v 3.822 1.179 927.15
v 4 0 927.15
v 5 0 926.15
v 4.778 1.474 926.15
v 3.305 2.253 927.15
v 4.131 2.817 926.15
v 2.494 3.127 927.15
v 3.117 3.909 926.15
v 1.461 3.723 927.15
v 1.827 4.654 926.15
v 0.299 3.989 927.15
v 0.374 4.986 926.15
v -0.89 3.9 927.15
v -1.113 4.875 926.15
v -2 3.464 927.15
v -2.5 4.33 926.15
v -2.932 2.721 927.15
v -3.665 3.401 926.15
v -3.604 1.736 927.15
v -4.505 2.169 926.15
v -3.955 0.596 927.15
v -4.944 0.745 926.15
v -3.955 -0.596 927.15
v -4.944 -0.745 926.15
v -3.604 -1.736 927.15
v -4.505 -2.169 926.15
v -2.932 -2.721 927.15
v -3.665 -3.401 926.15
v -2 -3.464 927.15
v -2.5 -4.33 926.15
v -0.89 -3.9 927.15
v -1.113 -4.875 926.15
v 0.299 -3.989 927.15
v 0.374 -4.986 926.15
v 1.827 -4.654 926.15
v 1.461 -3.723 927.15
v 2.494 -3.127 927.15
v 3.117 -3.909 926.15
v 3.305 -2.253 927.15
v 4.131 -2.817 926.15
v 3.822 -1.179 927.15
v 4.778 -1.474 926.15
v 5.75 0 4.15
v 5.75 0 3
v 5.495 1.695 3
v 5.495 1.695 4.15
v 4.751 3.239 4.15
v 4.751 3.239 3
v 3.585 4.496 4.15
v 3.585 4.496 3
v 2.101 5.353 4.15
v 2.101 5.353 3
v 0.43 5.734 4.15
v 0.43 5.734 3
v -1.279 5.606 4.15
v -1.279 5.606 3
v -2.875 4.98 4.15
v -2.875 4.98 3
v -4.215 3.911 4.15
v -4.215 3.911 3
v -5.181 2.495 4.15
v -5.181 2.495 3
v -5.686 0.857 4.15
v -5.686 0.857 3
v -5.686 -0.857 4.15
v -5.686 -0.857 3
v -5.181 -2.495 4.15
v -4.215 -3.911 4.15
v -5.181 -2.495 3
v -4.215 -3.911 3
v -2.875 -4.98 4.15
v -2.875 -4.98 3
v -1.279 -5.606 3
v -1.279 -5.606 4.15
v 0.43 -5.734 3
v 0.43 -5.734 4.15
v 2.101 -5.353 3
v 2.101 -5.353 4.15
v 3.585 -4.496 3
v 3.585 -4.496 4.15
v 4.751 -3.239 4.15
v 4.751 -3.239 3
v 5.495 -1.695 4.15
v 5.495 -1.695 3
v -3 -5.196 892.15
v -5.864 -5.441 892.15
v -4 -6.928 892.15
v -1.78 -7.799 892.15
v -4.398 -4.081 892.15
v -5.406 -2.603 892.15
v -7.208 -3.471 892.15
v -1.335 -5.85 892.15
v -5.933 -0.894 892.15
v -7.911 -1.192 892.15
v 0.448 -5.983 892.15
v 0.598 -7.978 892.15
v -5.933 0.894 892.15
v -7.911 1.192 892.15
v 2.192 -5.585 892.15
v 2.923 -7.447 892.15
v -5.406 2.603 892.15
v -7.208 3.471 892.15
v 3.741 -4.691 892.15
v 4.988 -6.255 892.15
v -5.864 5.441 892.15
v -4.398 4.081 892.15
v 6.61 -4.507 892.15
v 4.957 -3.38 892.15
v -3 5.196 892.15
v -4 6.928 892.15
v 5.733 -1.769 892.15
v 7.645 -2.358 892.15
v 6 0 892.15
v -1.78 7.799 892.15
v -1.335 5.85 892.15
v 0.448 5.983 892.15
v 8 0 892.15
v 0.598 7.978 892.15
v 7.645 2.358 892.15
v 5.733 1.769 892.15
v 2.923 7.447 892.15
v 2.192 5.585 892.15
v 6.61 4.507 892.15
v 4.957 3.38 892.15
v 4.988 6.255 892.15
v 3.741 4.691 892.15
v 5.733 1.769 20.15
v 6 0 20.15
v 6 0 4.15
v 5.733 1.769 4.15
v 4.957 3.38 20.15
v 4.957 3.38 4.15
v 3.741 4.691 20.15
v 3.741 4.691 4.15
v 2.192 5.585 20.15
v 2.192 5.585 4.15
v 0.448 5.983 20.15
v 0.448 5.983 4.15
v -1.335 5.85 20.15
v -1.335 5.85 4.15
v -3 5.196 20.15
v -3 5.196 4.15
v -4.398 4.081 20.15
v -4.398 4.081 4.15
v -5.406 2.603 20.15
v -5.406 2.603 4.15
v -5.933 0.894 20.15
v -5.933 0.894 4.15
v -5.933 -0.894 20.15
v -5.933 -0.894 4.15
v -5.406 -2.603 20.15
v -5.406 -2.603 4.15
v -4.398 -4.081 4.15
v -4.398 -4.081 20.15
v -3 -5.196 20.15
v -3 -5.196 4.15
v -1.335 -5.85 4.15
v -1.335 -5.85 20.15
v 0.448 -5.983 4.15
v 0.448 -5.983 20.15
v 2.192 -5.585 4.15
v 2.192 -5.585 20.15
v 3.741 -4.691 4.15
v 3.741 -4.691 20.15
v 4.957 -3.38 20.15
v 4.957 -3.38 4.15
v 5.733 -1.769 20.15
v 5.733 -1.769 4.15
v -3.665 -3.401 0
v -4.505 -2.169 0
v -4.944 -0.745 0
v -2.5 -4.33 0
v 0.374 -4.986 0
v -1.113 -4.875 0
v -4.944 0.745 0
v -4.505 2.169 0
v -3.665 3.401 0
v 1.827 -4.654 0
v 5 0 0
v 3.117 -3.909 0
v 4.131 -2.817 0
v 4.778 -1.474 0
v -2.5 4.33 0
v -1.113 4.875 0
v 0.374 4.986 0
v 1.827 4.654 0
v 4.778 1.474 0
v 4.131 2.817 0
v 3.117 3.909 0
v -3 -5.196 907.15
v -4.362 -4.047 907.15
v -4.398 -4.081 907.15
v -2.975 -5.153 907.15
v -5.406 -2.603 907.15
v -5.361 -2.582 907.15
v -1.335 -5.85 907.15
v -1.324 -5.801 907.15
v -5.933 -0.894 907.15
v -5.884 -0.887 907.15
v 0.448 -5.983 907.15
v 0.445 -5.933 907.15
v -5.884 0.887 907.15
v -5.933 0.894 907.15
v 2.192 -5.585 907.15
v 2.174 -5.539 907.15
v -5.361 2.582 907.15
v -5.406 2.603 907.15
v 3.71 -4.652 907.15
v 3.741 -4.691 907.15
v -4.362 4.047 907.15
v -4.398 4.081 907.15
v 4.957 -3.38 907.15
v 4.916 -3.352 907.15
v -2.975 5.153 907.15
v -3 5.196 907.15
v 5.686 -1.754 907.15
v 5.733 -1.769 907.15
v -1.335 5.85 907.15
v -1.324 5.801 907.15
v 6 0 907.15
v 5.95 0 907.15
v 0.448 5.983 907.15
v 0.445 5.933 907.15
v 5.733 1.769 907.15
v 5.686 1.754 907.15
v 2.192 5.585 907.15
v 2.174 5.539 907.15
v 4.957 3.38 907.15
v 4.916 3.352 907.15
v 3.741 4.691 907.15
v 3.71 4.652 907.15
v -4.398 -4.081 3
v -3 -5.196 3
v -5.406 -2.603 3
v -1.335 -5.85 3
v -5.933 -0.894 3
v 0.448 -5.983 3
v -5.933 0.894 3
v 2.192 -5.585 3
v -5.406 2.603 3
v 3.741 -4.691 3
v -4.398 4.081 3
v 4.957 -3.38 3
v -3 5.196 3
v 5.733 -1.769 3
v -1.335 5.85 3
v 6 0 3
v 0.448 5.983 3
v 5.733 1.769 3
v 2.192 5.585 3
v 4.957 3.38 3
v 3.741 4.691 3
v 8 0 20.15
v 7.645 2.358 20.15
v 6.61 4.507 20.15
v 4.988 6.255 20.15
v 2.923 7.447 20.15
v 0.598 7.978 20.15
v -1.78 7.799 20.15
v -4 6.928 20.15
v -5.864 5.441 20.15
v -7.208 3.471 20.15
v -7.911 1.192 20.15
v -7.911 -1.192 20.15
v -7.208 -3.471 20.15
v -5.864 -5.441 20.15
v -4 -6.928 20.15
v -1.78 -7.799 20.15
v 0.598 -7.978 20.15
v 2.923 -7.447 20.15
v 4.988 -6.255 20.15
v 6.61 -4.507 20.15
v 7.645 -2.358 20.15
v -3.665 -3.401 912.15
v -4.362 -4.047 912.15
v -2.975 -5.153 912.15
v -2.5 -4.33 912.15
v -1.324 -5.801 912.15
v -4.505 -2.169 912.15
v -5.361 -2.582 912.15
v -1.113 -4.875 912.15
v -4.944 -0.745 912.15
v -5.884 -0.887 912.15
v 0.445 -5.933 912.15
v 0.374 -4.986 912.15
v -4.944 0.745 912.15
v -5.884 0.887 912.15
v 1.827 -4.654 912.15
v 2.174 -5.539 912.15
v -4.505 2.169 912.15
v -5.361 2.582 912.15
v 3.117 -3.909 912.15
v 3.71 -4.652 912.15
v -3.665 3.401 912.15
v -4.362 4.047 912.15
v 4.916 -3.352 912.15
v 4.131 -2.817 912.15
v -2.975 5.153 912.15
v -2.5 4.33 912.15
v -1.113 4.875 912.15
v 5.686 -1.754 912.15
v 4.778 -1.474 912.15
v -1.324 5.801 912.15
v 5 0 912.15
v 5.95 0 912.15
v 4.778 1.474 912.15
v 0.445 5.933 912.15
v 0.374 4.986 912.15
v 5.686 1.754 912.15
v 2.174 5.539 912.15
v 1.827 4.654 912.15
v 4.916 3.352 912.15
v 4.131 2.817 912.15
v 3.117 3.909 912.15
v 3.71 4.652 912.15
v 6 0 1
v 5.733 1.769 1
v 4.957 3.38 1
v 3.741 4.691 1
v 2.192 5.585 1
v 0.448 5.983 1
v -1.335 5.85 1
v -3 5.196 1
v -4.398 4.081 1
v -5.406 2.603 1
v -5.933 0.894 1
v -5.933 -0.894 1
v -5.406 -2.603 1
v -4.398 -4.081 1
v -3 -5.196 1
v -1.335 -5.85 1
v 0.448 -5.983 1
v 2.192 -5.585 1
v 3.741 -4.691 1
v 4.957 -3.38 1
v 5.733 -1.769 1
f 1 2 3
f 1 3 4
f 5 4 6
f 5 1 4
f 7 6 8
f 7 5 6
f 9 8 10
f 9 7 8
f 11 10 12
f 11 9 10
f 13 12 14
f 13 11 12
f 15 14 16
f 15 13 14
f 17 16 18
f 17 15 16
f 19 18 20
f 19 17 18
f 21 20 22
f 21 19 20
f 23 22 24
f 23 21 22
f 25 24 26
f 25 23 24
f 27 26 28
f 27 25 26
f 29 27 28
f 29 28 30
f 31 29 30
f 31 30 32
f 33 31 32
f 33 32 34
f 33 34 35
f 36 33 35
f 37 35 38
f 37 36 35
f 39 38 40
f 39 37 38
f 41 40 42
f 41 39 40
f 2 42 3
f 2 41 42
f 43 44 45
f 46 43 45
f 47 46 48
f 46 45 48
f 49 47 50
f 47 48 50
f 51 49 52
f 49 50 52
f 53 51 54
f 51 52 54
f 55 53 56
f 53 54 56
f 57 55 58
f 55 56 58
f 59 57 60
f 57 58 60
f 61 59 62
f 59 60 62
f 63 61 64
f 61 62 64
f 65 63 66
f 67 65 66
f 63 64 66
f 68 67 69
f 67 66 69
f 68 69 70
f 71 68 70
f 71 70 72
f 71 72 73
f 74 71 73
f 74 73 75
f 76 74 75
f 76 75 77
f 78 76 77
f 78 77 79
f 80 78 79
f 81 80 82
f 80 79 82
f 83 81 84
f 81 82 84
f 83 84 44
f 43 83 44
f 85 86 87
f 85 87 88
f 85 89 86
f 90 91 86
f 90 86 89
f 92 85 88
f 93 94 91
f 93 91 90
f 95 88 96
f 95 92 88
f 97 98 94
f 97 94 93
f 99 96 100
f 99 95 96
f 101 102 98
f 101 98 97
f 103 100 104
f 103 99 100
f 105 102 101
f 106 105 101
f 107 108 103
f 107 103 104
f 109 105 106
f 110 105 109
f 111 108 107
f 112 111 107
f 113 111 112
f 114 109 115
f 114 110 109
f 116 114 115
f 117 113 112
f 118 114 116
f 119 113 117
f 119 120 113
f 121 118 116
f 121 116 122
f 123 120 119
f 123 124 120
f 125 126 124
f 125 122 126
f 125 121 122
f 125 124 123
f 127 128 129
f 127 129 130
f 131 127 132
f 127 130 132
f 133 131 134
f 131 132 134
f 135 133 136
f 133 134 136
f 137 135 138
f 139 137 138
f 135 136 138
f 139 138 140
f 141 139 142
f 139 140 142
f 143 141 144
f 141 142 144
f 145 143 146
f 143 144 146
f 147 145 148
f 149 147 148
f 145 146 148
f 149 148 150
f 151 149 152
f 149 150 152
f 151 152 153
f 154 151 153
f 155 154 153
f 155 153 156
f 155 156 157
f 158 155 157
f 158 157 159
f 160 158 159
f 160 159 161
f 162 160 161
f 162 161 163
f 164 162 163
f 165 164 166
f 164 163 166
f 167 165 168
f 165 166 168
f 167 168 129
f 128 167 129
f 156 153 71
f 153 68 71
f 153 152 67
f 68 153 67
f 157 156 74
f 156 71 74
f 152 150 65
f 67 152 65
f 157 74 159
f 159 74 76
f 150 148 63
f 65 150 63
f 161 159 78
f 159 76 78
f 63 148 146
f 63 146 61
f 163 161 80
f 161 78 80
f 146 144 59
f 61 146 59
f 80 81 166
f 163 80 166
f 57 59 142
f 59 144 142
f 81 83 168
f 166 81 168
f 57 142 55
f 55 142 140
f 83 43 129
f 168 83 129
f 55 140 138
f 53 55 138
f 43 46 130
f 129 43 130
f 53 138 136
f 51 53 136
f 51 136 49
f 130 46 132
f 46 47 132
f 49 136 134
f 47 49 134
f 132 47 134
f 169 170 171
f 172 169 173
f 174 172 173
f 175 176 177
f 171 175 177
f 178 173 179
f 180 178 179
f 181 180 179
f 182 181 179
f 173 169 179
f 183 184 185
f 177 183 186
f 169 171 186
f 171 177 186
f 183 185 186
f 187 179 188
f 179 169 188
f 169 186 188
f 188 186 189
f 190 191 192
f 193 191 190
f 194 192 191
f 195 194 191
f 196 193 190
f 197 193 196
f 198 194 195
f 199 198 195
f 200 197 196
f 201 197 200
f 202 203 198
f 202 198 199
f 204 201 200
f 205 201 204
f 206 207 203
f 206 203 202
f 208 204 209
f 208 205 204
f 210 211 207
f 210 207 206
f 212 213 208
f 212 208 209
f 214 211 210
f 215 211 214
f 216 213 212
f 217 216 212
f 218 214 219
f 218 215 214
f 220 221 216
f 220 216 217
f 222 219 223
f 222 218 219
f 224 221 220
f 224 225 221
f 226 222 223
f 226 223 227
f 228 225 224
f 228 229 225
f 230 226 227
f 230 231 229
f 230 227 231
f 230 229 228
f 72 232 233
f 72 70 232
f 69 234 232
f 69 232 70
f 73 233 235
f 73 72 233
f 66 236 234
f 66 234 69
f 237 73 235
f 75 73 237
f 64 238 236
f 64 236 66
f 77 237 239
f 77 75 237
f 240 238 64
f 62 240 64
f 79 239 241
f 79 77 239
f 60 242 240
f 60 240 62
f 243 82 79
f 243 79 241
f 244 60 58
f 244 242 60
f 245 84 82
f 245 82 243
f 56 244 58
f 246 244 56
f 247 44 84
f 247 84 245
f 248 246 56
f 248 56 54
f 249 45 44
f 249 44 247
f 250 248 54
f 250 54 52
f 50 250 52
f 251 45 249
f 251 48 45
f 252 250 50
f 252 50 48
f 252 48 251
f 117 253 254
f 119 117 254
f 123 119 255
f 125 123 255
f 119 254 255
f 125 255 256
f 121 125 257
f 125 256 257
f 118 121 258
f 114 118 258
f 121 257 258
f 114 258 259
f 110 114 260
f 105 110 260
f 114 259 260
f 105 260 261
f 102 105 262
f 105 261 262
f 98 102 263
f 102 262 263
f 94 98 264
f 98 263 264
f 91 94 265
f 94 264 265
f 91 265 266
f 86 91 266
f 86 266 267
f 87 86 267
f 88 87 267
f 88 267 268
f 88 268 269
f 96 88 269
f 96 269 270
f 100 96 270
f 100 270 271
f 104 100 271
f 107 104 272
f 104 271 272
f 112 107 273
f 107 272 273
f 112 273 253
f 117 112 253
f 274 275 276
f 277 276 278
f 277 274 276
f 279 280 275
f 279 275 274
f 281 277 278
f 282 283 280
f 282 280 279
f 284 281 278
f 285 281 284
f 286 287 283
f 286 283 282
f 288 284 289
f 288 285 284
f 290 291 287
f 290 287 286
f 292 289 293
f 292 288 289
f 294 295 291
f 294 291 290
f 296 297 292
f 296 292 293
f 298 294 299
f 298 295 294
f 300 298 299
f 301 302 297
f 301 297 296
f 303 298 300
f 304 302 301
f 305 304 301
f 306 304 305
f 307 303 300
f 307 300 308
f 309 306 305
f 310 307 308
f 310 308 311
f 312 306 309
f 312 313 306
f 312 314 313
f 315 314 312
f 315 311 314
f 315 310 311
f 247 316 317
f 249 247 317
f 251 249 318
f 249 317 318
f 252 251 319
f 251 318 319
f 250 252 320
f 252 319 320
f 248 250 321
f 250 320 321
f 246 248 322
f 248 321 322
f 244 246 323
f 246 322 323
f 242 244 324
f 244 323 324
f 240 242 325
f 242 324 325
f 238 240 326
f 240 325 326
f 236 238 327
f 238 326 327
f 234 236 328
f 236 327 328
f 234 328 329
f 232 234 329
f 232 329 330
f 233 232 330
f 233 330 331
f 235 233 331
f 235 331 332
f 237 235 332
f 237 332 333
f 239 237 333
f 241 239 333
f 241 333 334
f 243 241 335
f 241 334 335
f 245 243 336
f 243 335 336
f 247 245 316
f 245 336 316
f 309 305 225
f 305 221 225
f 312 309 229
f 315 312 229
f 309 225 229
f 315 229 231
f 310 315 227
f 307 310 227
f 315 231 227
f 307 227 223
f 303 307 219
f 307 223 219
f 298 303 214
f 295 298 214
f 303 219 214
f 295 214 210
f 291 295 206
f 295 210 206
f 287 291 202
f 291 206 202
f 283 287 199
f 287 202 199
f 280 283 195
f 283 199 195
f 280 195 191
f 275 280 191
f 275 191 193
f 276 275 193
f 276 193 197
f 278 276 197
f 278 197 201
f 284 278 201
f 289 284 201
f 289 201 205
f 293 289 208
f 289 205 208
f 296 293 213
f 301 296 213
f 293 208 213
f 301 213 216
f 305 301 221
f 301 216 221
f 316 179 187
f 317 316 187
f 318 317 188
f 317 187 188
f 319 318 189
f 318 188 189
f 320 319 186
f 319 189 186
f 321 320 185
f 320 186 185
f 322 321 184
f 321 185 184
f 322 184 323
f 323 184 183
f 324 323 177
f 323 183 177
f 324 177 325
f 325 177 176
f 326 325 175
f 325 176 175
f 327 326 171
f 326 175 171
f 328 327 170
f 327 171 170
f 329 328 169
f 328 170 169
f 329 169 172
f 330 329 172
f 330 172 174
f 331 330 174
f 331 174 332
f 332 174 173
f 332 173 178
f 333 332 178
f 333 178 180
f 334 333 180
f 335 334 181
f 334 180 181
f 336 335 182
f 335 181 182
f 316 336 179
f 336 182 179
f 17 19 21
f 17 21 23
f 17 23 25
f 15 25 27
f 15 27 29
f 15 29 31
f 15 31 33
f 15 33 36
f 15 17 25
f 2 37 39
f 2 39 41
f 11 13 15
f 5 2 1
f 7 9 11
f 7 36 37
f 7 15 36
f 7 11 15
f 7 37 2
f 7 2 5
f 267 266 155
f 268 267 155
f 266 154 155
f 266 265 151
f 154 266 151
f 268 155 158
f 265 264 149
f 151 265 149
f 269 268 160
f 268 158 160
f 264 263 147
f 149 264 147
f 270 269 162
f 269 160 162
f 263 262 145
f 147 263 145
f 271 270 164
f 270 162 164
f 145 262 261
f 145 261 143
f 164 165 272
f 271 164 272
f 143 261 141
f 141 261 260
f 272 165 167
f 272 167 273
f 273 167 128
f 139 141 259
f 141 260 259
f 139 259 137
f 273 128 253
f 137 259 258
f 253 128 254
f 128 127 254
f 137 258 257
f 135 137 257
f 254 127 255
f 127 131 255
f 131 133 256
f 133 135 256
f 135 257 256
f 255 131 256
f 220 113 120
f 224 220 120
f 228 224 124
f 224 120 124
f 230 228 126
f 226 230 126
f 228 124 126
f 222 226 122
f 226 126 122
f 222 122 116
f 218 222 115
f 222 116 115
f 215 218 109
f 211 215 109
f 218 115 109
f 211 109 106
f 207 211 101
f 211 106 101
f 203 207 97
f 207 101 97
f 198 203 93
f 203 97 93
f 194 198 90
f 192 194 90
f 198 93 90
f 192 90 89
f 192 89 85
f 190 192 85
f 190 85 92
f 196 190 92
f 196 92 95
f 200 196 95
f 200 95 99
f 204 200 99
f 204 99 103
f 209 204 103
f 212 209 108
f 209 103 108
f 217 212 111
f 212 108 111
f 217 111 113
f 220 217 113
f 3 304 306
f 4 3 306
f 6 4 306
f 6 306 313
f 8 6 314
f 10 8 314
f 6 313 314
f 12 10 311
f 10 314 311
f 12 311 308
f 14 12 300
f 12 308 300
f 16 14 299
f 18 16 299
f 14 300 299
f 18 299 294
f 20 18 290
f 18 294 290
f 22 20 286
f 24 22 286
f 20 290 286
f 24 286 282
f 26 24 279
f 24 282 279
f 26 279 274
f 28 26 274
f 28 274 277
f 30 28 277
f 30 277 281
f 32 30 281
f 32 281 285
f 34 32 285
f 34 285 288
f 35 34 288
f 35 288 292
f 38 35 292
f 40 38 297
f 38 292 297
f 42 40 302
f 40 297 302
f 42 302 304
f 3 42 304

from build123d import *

# Parameters (mm, degrees)
F0_R      = 6
F1_DEPTH  = 3
F2_R      = 5.75
F3_DEPTH  = 1.15
F4_R      = 6
F4_R_2    = 5.75
F5_DEPTH  = 16
F6_R      = 8
F6_R_2    = 6
F7_DEPTH  = 872
F8_R      = 6
F9_DEPTH  = 15
F10_R     = 5.95
F11_DEPTH = 2
F12_R     = 5.95
F13_DEPTH = 3
F14_R     = 5
F15_DEPTH = 15
F16_SIZE  = 1


with BuildPart() as f1:
    # F0 (on Top) → F1 (new body)
    with BuildSketch(Plane.XY):
        Circle(F0_R)
    extrude(amount=F1_DEPTH)

    # F2 (on face) → F3 (join)
    with BuildSketch(Plane.XY.offset(3)):
        Circle(F2_R)
    extrude(amount=F3_DEPTH)

    # F4 (on face) → F5 (join)
    with BuildSketch(Plane.XY.offset(4.15)):
        Circle(F4_R)
        Circle(F4_R_2, mode=Mode.SUBTRACT)
        Circle(F4_R_2)
    extrude(amount=F5_DEPTH)

    # F6 (on face) → F7 (join)
    with BuildSketch(Plane.XY.offset(20.15)):
        Circle(F6_R)
        Circle(F6_R_2, mode=Mode.SUBTRACT)
        Circle(F6_R_2)
    extrude(amount=F7_DEPTH)

    # F8 (on face) → F9 (join)
    with BuildSketch(Plane.XY.offset(892.15)):
        Circle(F8_R)
    extrude(amount=F9_DEPTH)

    # F10 (on face) → F11 (join)
    with BuildSketch(Plane.XY.offset(907.15)):
        Circle(F10_R)
    extrude(amount=F11_DEPTH)

    # F12 (on face) → F13 (join)
    with BuildSketch(Plane.XY.offset(909.15)):
        Circle(F12_R)
    extrude(amount=F13_DEPTH)

    # F14 (on face) → F15 (join)
    with BuildSketch(Plane.XY.offset(912.15)):
        Circle(F14_R)
    extrude(amount=F15_DEPTH)

    # F16
    f16_edges = [f1.edges().sort_by_distance(p)[0] for p in [
        (-5, 0, 927.15),
        (-6, 0, 0),
    ]]
    chamfer(f16_edges, length=F16_SIZE)


solid = f1.part
